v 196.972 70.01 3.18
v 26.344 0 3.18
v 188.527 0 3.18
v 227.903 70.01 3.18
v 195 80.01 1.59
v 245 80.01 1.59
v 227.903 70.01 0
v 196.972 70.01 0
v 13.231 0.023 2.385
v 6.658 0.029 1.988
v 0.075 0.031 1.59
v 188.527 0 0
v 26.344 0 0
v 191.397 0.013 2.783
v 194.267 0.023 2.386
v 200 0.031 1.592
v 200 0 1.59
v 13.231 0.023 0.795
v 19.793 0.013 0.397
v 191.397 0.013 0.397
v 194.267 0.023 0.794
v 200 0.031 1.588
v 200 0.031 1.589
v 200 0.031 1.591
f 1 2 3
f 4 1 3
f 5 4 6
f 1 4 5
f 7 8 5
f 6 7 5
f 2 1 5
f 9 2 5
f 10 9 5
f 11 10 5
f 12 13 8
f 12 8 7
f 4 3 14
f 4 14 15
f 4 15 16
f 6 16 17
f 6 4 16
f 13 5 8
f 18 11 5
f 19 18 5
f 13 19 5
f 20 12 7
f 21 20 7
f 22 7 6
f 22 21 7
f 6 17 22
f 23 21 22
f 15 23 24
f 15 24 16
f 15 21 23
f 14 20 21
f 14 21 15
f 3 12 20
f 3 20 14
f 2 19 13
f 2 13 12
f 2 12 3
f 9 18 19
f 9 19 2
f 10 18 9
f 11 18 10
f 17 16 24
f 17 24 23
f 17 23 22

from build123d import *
from OCP.BRepFilletAPI import BRepFilletAPI_MakeChamfer

# Parameters (mm, degrees)
BOSS_EXTRUDE1_DEPTH = 3.18
CHAMFER1_SIZE       = 1.59
CHAMFER1_SIZE2      = 10
CHAMFER2_SIZE       = 10
CHAMFER2_SIZE_2     = 1.59
SKETCH2_R           = 41
CUT_EXTRUDE1_DEPTH  = 200


with BuildPart() as part:
    # Sketch1 → Boss-Extrude1 (new body)
    with BuildSketch(Plane.XY):
        Polygon((0, 0), (200, 0), (245, 80.01), (195, 80.01), align=None)
    extrude(amount=BOSS_EXTRUDE1_DEPTH)

    # Chamfer1: one chamfer whose edges measure the first distance from different faces: ONE call of the kernel's chamfer builder (chamfer() names one face for all edges)
    chamfer1_edges_1 = [part.edges().sort_by_distance(p)[0] for p in [
        (222.5, 40.005, 3.18),
    ]]
    chamfer1_side_1 = [part.faces().sort_by_distance(p)[0] for p in [
        (222.5, 40.005, 1.59),
    ]]
    chamfer1_edges_2 = [part.edges().sort_by_distance(p)[0] for p in [
        (220, 80.01, 3.18),
    ]]
    chamfer1_side_2 = [part.faces().sort_by_distance(p)[0] for p in [
        (220, 80.01, 1.59),
    ]]
    chamfer1_edges_3 = [part.edges().sort_by_distance(p)[0] for p in [
        (97.5, 40.005, 3.18),
    ]]
    chamfer1_side_3 = [part.faces().sort_by_distance(p)[0] for p in [
        (97.5, 40.005, 1.59),
    ]]
    chamfer1 = BRepFilletAPI_MakeChamfer(part.part.solid().wrapped)
    for e in chamfer1_edges_1:
        chamfer1.Add(CHAMFER1_SIZE, CHAMFER1_SIZE2, e.wrapped, chamfer1_side_1[0].wrapped)  # the first distance lies on this face
    for e in chamfer1_edges_2:
        chamfer1.Add(CHAMFER1_SIZE, CHAMFER1_SIZE2, e.wrapped, chamfer1_side_2[0].wrapped)  # the first distance lies on this face
    for e in chamfer1_edges_3:
        chamfer1.Add(CHAMFER1_SIZE, CHAMFER1_SIZE2, e.wrapped, chamfer1_side_3[0].wrapped)  # the first distance lies on this face
    add(Compound.cast(chamfer1.Shape()), mode=Mode.REPLACE)

    # Chamfer2
    # the kernel refuses this chamfer: 10, 1.59 mm, written as the material it takes off along each edge
    with BuildSketch(Plane(origin=(187.260266978, -22.651245312, 0), x_dir=(-0.8715858085324353, 0.49020574158179714, -0.006042291378384645), z_dir=(0.4902146903574218, 0.8716017194554959, 0))) as chamfer2_piece_1:
        Polygon((CHAMFER2_SIZE * 0.999981745191, CHAMFER2_SIZE * 0.00604229137838), (-CHAMFER2_SIZE_2 * 0.00604229137837, CHAMFER2_SIZE_2 * 0.999981745191), (0, 0), align=None)
    extrude(amount=143.772651921, mode=Mode.SUBTRACT)
    with BuildSketch(Plane(origin=(219.042912573, 89.874991974, 0), x_dir=(-0.0882418861116751, 0.21506271455788833, 0.9726054690070617), z_dir=(-0.9251519574595215, -0.3795969646991606, 0))) as chamfer2_piece_2:
        Polygon((CHAMFER2_SIZE_2 * 0.972605469007, -CHAMFER2_SIZE_2 * 0.232462043477), (-CHAMFER2_SIZE * 0.232462043477, -CHAMFER2_SIZE * 0.972605469007), (0, 0), align=None)
    extrude(amount=262.752322131, mode=Mode.SUBTRACT)
    with BuildSketch(Plane(origin=(270.98806864, 80.01, 0), x_dir=(0, -0.9999817451908304, -0.006042291378384625), z_dir=(-1, 0, 0))) as chamfer2_piece_3:
        Polygon((CHAMFER2_SIZE * 0.999981745191, CHAMFER2_SIZE * 0.00604229137838), (-CHAMFER2_SIZE_2 * 0.00604229137838, CHAMFER2_SIZE_2 * 0.999981745191), (0, 0), align=None)
    extrude(amount=101.976137281, mode=Mode.SUBTRACT)

    # Sketch2 → Cut-Extrude1 (cut)
    with BuildSketch(Plane(origin=(0, 0, 0), x_dir=(0, 0, -1), z_dir=(1, 0, 0))):
        with Locations((-1.59, -40.969157912)):
            Circle(SKETCH2_R)
    extrude(amount=CUT_EXTRUDE1_DEPTH, mode=Mode.SUBTRACT)


solid = part.part
